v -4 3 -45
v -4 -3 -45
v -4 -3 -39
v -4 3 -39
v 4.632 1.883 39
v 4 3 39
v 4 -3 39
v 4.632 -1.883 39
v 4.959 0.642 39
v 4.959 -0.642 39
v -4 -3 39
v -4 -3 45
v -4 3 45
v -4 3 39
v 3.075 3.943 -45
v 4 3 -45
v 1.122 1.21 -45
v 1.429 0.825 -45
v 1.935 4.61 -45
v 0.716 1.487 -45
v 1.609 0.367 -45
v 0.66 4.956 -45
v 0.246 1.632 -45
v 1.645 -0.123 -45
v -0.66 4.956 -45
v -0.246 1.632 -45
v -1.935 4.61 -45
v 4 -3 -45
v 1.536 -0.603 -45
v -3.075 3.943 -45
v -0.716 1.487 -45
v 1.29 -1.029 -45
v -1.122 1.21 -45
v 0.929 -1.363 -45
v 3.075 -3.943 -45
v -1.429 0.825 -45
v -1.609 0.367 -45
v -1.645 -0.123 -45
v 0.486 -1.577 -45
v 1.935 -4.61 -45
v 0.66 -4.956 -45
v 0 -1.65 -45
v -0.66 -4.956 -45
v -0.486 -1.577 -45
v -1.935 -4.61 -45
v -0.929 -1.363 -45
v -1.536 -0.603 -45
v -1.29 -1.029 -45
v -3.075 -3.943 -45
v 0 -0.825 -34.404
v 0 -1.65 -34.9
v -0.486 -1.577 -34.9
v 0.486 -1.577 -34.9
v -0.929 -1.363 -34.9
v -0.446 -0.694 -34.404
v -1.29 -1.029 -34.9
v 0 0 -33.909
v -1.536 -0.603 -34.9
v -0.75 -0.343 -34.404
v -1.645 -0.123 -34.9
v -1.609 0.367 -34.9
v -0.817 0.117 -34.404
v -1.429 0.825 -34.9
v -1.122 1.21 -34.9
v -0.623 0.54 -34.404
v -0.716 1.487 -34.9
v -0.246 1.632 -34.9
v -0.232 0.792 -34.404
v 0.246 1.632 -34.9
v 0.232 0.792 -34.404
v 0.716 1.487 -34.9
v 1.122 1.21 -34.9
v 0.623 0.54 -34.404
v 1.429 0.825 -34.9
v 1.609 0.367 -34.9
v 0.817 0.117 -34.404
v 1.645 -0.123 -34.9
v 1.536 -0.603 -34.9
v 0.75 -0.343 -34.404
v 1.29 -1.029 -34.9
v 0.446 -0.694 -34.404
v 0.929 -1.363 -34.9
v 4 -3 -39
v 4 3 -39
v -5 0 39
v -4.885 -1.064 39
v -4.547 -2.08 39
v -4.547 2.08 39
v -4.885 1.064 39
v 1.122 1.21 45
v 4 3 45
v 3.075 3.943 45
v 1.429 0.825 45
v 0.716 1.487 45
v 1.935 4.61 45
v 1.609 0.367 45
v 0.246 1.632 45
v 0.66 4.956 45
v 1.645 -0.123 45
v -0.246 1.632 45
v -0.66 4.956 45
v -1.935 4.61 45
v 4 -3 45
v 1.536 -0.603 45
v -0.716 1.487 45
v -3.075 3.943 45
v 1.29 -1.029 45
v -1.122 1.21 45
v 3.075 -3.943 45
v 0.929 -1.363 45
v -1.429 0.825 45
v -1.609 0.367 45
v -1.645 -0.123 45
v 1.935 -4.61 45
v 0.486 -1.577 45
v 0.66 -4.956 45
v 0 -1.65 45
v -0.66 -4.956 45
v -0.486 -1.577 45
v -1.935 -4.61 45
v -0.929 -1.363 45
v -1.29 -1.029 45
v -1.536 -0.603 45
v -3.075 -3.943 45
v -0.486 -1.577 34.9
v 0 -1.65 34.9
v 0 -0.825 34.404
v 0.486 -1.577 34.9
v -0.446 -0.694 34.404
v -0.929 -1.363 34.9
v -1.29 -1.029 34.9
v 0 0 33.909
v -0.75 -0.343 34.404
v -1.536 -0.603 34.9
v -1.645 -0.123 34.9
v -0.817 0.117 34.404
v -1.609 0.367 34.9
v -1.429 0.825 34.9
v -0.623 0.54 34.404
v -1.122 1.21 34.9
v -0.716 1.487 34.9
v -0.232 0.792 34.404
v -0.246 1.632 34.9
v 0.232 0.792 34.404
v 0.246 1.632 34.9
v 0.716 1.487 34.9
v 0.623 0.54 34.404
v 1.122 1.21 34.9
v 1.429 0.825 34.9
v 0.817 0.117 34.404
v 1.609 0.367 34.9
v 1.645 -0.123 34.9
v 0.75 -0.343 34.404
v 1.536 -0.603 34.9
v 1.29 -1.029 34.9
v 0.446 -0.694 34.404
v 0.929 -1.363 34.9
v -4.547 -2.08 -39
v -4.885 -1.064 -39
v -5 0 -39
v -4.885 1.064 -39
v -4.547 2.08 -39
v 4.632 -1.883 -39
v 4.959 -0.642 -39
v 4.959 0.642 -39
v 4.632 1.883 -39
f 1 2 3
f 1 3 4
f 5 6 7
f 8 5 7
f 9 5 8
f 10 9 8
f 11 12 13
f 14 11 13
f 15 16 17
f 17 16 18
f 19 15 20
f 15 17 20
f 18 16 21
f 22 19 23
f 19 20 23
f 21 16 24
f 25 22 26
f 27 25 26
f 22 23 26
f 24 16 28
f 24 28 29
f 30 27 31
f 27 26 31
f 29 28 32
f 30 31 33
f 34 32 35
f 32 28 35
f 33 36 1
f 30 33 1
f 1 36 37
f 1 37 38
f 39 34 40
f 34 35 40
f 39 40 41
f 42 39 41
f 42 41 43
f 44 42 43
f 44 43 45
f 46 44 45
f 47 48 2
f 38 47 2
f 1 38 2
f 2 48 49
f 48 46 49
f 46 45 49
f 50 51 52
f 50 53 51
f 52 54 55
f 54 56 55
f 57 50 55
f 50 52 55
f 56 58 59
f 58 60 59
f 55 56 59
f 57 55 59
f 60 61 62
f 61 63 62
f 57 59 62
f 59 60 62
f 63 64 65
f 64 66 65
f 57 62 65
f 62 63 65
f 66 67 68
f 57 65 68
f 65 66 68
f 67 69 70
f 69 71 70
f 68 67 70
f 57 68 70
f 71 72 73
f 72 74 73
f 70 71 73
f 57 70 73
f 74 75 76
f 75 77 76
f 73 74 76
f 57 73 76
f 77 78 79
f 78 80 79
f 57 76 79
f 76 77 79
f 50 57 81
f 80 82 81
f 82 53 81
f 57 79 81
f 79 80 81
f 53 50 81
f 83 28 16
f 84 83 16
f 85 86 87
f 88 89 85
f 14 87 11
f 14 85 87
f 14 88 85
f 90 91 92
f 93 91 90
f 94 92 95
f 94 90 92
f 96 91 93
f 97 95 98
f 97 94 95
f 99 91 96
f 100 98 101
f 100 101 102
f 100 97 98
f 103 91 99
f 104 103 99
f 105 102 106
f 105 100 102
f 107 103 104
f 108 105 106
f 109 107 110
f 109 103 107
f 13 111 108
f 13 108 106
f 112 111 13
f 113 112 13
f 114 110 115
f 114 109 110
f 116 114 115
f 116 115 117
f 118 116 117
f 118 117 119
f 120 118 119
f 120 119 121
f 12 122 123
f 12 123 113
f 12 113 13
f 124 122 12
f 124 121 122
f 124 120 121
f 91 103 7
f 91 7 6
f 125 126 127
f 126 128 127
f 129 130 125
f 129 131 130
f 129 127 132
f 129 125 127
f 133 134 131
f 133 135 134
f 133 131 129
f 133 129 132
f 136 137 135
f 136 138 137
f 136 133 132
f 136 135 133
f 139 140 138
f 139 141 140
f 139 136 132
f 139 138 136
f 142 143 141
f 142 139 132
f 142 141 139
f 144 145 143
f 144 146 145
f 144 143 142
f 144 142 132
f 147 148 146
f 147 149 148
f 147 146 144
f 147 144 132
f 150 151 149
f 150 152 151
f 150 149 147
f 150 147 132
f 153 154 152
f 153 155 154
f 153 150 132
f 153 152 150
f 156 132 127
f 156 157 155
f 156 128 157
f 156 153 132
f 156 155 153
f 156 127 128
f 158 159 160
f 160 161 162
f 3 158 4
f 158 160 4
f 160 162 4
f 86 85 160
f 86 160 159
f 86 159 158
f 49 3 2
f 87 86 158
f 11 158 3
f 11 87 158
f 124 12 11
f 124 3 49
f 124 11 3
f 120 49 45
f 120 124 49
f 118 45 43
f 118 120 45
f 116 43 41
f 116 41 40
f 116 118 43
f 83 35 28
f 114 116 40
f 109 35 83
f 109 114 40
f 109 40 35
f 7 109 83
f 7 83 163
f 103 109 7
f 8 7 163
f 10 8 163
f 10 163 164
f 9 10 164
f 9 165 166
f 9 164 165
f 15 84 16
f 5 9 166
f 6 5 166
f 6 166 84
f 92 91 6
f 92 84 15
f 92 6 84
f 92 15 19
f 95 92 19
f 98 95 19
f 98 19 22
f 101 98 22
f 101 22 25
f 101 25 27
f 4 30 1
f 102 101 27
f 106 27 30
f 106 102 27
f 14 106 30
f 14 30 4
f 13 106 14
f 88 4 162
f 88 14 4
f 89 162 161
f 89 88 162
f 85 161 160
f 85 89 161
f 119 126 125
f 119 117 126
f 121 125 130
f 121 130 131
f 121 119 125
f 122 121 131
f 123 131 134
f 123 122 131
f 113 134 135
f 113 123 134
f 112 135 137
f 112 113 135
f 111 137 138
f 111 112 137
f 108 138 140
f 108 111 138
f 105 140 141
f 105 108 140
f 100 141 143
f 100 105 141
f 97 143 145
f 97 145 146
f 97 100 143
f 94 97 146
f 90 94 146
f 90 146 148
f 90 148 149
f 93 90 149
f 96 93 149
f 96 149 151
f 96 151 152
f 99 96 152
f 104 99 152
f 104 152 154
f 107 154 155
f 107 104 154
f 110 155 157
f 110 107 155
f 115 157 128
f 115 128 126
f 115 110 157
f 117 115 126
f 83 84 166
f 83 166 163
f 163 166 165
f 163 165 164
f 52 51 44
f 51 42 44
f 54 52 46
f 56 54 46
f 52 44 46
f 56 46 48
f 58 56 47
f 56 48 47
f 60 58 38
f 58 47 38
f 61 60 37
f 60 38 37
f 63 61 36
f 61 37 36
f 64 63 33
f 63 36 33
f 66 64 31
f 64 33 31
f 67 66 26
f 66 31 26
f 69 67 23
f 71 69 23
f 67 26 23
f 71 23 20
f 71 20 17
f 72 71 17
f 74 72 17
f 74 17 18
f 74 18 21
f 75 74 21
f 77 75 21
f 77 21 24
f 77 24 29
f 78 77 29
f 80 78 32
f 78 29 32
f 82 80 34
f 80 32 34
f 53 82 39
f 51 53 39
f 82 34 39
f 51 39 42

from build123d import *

# Parameters (mm, degrees)
SKETCH_1_R          = 5
EXTRUDE_1_DEPTH     = 45
CUT_EXTRUDE_1_DEPTH = 6


with BuildPart() as part:
    # 草图1 → 凸台-拉伸1 (new, symmetric)
    with BuildSketch(Plane.XY):
        with Locations(Location((0, 0, 0), (0, 0, 180))):
            Circle(SKETCH_1_R)
    extrude(amount=EXTRUDE_1_DEPTH, both=True)

    # 草图2 → 切除-拉伸1 (cut)
    with BuildSketch(Plane.XY.offset(45)):
        with BuildLine():
            Line((-4, -3), (-4, 3))
            ThreePointArc((-4, 3), (-5, 0), (-4, -3))
        make_face()
        with BuildLine():
            Line((4, -3), (4, 3))
            ThreePointArc((4, 3), (5, 0), (4, -3))
        make_face()
    cut_extrude_1 = extrude(amount=-CUT_EXTRUDE_1_DEPTH, mode=Mode.SUBTRACT)

    # 草图3 → M4 螺纹孔1 (revolve, cut)
    with BuildSketch(Plane(origin=(0, 0, 45), x_dir=(0, -1, 0), z_dir=(1, 0, 0))):
        Polygon((0, 0), (0, 11.091420021), (1.65, 10.1), (1.65, 0), align=None)
    hole_wizard_m4_1 = revolve(axis=Axis((0, 0, 51.35), (0, 0, -1)), mode=Mode.SUBTRACT)

    # 镜向1: 切除-拉伸1, M4 螺纹孔1 across plane
    add(cut_extrude_1.mirror(Plane.XY), mode=Mode.SUBTRACT)
    add(hole_wizard_m4_1.mirror(Plane.XY), mode=Mode.SUBTRACT)


solid = part.part
